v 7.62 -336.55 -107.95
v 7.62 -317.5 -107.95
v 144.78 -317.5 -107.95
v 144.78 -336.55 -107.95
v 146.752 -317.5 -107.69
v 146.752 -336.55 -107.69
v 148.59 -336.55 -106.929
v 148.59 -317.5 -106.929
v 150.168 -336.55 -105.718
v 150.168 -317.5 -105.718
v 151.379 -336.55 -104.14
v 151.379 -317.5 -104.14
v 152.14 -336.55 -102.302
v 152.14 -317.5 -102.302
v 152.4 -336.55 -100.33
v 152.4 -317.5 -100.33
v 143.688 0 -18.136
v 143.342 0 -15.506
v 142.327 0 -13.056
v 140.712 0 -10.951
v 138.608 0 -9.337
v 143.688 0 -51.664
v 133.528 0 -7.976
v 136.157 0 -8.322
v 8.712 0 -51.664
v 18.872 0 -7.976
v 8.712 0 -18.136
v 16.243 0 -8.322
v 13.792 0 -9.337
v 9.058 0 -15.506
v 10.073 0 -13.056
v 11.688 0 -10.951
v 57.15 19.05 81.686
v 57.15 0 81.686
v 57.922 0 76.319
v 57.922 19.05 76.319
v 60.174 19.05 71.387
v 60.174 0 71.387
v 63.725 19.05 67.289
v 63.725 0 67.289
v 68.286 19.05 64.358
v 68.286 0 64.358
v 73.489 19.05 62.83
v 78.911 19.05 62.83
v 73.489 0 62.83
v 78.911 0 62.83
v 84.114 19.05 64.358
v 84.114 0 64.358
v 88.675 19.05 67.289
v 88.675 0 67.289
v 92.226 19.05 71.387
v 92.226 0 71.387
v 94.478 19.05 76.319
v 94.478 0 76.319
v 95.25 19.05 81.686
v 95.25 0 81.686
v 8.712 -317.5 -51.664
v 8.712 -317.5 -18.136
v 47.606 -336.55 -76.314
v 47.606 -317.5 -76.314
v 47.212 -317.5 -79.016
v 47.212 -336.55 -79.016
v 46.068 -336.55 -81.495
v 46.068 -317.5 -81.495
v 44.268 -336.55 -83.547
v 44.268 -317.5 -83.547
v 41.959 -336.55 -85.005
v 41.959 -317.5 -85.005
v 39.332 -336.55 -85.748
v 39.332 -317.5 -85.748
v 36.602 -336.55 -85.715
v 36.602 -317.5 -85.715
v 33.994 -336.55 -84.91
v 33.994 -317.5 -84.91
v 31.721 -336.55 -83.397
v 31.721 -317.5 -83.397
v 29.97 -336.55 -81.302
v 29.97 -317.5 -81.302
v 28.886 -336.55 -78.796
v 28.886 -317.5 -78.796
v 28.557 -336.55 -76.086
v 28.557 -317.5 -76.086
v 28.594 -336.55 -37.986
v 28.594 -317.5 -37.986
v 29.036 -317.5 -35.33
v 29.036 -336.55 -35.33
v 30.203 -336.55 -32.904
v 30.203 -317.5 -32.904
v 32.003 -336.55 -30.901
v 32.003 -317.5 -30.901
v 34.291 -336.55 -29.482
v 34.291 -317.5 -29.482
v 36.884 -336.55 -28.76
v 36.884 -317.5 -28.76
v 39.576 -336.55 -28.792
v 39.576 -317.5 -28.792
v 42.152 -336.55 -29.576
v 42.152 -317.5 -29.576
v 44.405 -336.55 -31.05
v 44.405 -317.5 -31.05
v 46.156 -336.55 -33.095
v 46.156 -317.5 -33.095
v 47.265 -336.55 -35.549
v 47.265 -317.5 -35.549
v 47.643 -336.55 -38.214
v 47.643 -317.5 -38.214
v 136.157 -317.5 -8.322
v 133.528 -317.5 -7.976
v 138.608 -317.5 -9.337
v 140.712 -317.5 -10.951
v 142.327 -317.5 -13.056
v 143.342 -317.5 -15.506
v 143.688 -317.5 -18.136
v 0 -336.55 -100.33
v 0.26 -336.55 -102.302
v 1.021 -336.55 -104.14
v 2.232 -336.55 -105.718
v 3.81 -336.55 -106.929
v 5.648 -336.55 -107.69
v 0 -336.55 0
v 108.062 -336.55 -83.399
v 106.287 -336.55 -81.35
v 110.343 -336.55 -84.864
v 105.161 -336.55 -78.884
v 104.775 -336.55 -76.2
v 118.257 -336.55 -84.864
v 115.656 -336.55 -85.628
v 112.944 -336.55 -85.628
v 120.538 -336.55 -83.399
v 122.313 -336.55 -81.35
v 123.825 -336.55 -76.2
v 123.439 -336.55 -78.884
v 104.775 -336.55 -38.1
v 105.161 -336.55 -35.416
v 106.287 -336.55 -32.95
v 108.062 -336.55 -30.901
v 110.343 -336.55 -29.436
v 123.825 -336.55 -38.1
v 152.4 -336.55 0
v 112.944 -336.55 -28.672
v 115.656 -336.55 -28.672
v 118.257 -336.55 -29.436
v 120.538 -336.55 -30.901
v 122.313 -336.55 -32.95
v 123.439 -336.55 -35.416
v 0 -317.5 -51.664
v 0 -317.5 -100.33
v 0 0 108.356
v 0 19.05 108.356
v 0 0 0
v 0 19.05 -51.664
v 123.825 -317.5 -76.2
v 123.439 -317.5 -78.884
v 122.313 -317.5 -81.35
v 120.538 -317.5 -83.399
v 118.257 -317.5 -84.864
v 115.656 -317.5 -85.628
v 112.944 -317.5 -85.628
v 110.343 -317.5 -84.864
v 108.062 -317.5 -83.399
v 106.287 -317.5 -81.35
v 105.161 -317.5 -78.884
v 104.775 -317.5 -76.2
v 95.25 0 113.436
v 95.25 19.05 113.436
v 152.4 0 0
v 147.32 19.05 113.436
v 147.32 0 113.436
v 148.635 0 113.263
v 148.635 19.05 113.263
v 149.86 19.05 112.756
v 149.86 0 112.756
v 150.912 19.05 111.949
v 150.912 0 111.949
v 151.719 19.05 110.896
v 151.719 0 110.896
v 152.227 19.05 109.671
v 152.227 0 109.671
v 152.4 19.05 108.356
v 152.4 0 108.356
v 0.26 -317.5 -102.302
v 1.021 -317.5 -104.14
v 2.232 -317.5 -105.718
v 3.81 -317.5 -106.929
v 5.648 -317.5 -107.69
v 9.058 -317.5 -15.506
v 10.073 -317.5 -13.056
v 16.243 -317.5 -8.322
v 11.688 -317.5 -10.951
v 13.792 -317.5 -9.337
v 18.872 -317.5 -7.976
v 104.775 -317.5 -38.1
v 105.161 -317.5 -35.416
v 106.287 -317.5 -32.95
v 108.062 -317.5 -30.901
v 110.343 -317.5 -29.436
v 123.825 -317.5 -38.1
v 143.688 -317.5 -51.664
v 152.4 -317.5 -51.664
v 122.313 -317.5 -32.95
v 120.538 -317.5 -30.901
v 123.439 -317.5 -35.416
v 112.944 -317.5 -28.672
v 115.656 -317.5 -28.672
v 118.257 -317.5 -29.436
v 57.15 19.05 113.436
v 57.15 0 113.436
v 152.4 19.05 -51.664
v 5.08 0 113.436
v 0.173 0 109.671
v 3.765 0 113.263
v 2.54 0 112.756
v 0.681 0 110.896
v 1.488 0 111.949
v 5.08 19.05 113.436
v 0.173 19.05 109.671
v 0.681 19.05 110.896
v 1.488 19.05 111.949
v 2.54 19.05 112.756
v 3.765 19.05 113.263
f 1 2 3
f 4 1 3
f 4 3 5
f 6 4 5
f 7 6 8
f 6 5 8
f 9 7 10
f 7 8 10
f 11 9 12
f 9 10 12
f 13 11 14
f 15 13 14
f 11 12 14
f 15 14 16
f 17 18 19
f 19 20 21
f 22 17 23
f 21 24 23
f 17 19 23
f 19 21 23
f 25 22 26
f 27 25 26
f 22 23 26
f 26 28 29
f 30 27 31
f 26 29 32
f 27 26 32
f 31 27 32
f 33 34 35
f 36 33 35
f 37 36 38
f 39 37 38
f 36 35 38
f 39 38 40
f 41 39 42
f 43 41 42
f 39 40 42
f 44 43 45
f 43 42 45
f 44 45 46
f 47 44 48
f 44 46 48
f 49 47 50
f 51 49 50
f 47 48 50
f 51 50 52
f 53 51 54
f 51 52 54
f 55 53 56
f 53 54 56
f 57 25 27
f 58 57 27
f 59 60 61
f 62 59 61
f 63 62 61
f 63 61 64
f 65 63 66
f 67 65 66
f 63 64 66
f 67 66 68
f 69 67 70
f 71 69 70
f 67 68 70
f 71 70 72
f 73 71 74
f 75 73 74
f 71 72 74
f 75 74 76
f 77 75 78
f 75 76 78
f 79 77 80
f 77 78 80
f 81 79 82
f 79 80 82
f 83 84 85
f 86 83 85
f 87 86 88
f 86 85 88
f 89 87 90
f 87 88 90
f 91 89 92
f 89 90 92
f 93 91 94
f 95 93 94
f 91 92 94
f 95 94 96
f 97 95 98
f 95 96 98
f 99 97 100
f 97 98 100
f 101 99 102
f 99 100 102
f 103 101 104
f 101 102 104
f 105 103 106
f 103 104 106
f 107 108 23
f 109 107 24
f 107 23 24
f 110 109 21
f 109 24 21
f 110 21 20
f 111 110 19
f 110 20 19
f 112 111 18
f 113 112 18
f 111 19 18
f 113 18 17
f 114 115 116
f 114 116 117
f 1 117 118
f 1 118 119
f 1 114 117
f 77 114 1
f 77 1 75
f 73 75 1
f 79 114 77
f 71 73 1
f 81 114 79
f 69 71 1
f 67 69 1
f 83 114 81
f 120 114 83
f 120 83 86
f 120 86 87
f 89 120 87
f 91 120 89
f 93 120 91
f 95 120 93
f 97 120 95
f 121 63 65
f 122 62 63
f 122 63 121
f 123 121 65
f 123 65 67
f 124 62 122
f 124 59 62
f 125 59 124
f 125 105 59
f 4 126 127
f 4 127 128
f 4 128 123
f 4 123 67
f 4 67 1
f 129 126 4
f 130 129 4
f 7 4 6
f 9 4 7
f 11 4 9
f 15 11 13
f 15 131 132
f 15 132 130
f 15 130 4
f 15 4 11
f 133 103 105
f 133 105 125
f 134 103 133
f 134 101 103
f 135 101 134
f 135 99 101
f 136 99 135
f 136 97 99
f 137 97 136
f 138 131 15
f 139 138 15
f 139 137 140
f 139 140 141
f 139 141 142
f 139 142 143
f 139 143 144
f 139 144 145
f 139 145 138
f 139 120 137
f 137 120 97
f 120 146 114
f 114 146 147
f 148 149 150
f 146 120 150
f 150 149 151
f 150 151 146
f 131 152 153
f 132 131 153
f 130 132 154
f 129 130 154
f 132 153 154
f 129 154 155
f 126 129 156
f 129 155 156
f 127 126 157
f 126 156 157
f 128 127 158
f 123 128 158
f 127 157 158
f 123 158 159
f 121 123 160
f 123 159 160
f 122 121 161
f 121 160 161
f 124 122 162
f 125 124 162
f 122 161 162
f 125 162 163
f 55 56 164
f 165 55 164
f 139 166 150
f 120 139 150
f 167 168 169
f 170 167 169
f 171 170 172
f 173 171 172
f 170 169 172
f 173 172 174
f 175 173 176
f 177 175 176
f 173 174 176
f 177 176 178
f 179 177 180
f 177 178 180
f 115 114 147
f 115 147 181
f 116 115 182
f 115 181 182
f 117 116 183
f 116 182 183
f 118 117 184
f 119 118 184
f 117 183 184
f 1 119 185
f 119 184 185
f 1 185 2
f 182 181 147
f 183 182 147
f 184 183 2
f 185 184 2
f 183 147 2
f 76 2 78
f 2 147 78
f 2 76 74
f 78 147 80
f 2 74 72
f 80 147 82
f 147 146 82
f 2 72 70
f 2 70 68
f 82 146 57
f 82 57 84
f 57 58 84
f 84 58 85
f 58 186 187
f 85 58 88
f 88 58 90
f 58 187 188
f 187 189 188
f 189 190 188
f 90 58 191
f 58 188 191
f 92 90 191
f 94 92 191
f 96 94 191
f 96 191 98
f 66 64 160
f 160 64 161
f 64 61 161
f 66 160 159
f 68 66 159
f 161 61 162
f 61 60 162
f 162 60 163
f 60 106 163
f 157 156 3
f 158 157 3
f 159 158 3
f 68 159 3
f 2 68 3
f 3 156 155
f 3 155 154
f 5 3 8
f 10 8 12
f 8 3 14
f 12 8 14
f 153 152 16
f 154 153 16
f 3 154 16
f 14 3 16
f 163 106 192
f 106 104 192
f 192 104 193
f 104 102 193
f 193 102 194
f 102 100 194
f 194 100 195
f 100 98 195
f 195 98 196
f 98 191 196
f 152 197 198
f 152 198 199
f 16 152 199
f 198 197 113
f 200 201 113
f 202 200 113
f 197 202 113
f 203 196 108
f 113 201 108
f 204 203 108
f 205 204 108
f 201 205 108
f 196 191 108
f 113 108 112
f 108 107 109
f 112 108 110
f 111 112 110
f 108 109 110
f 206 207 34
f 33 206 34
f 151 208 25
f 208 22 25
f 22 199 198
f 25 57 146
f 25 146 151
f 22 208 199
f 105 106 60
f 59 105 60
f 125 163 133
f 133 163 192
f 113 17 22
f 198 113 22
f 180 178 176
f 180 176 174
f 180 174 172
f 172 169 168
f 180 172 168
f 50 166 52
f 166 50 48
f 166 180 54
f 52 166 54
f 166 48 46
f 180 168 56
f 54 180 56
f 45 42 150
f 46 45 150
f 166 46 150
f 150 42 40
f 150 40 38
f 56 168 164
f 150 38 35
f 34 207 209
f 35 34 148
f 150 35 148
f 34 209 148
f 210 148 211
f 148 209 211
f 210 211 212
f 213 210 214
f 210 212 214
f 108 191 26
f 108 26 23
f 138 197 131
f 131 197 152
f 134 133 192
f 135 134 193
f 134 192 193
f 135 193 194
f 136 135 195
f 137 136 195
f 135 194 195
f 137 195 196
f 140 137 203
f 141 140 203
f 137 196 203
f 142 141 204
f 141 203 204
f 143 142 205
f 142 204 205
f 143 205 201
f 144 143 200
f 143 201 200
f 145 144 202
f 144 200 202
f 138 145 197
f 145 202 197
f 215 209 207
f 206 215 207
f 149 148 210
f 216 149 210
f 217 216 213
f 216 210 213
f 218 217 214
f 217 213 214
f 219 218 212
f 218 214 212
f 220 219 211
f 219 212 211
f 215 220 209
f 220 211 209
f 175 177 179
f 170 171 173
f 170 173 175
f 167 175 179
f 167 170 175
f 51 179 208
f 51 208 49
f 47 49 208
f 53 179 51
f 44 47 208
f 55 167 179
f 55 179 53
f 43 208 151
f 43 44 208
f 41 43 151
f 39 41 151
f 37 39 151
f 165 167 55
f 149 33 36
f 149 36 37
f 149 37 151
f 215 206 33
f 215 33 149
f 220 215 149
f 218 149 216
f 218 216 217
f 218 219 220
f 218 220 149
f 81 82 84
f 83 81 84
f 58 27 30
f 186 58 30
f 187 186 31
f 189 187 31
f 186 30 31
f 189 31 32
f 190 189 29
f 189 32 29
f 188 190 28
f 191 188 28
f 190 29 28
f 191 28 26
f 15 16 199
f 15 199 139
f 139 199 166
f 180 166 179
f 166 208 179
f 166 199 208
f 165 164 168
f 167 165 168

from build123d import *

# Parameters (mm, degrees)
F1_DEPTH = 317.5
F4_DEPTH = 19.05
F5_DEPTH = 19.05


# Not quite as in the source:
# - a feature names something its author has since deleted; it is built from what else it names


with BuildPart() as f1:
    # F0 (on Front) → F1 (new body)
    with BuildSketch(Plane.XZ):
        with BuildLine():
            Line((152.4, 0), (0, 0))
            Line((0, 0), (0, -51.6636))
            Line((0, -51.6636), (8.7122, -51.6636))
            Line((8.7122, -51.6636), (8.7122, -18.1356))
            ThreePointArc((8.7122, -18.1356), (11.6879951031, -10.9513951031), (18.8722, -7.9756))
            Line((18.8722, -7.9756), (133.5278, -7.9756))
            ThreePointArc((133.5278, -7.9756), (140.7120048969, -10.9513951031), (143.6878, -18.1356))
            Line((143.6878, -18.1356), (143.6878, -51.6636))
            Line((143.6878, -51.6636), (152.4, -51.6636))
            Line((152.4, -51.6636), (152.4, 0))
        make_face()
    extrude(amount=F1_DEPTH)

    # F3 (on face) → F4 (join)
    with BuildSketch(Plane(origin=(0, 0, 0), x_dir=(-1, 0, 0), z_dir=(0, 1, 0))):
        with BuildLine():
            Line((-152.4, 108.3564), (-152.4, 0))
            Line((-152.4, 0), (0, 0))
            Line((0, 0), (0, 108.3564))
            ThreePointArc((0, 108.3564), (-1.4878975516, 111.9485024484), (-5.08, 113.4364))
            Line((-5.08, 113.4364), (-57.15, 113.4364))
            Line((-57.15, 113.4364), (-57.15, 81.6864))
            ThreePointArc((-57.15, 81.6864), (-76.2, 62.6364), (-95.25, 81.6864))
            Line((-95.25, 81.6864), (-95.25, 113.4364))
            Line((-95.25, 113.4364), (-147.32, 113.4364))
            ThreePointArc((-147.32, 113.4364), (-150.9121024484, 111.9485024484), (-152.4, 108.3564))
        make_face()
        with BuildLine():
            Line((-143.6878, -18.1356), (-143.6878, -51.6636))
            Line((-143.6878, -51.6636), (-8.7122, -51.6636))
            Line((-8.7122, -51.6636), (-8.7122, -18.1356))
            ThreePointArc((-8.7122, -18.1356), (-11.6879951031, -10.9513951031), (-18.8722, -7.9756))
            Line((-18.8722, -7.9756), (-133.5278, -7.9756))
            ThreePointArc((-133.5278, -7.9756), (-140.7120048969, -10.9513951031), (-143.6878, -18.1356))
        make_face()
        with BuildLine():
            Line((-152.4, 0), (-152.4, -51.6636))
            Line((-152.4, -51.6636), (-143.6878, -51.6636))
            Line((-143.6878, -51.6636), (-143.6878, -18.1356))
            ThreePointArc((-143.6878, -18.1356), (-140.7120048969, -10.9513951031), (-133.5278, -7.9756))
            Line((-133.5278, -7.9756), (-18.8722, -7.9756))
            ThreePointArc((-18.8722, -7.9756), (-11.6879951031, -10.9513951031), (-8.7122, -18.1356))
            Line((-8.7122, -18.1356), (-8.7122, -51.6636))
            Line((-8.7122, -51.6636), (0, -51.6636))
            Line((0, -51.6636), (0, 0))
            Line((0, 0), (-152.4, 0))
        make_face()
    extrude(amount=F4_DEPTH)

    # F2 (on face) → F5 (join)
    with BuildSketch(Plane.XZ.offset(317.5)):
        with BuildLine():
            Line((152.4, 0), (0, 0))
            Line((0, 0), (0, -100.33))
            ThreePointArc((0, -100.33), (2.2318463274, -105.7181536726), (7.62, -107.95))
            Line((7.62, -107.95), (144.78, -107.95))
            ThreePointArc((144.78, -107.95), (150.1681536726, -105.7181536726), (152.4, -100.33))
            Line((152.4, -100.33), (152.4, 0))
        make_face()
        with BuildLine():
            Line((28.5572737867, -76.085673397), (28.5940985013, -37.985673397))
            ThreePointArc((28.5940985013, -37.985673397), (38.2314841006, -28.6802259255), (47.6427262133, -38.214326603))
            Line((47.6427262133, -38.214326603), (47.6059014987, -76.314326603))
            ThreePointArc((47.6059014987, -76.314326603), (37.9659922536, -85.8300138104), (28.5572737867, -76.085673397))
        make_face(mode=Mode.SUBTRACT)
        with BuildLine():
            Line((104.7750042372, -76.2000004751), (104.7749957628, -38.099982679))
            ThreePointArc((104.7749957628, -38.099982679), (114.3000041857, -28.5750016435), (123.8249957628, -38.0999995249))
            Line((123.8249957628, -38.0999995249), (123.8250042372, -76.200017321))
            ThreePointArc((123.8250042372, -76.200017321), (114.2999958142, -85.7250194396), (104.7750042372, -76.2000004751))
        make_face(mode=Mode.SUBTRACT)
    extrude(amount=F5_DEPTH)


solid = f1.part
